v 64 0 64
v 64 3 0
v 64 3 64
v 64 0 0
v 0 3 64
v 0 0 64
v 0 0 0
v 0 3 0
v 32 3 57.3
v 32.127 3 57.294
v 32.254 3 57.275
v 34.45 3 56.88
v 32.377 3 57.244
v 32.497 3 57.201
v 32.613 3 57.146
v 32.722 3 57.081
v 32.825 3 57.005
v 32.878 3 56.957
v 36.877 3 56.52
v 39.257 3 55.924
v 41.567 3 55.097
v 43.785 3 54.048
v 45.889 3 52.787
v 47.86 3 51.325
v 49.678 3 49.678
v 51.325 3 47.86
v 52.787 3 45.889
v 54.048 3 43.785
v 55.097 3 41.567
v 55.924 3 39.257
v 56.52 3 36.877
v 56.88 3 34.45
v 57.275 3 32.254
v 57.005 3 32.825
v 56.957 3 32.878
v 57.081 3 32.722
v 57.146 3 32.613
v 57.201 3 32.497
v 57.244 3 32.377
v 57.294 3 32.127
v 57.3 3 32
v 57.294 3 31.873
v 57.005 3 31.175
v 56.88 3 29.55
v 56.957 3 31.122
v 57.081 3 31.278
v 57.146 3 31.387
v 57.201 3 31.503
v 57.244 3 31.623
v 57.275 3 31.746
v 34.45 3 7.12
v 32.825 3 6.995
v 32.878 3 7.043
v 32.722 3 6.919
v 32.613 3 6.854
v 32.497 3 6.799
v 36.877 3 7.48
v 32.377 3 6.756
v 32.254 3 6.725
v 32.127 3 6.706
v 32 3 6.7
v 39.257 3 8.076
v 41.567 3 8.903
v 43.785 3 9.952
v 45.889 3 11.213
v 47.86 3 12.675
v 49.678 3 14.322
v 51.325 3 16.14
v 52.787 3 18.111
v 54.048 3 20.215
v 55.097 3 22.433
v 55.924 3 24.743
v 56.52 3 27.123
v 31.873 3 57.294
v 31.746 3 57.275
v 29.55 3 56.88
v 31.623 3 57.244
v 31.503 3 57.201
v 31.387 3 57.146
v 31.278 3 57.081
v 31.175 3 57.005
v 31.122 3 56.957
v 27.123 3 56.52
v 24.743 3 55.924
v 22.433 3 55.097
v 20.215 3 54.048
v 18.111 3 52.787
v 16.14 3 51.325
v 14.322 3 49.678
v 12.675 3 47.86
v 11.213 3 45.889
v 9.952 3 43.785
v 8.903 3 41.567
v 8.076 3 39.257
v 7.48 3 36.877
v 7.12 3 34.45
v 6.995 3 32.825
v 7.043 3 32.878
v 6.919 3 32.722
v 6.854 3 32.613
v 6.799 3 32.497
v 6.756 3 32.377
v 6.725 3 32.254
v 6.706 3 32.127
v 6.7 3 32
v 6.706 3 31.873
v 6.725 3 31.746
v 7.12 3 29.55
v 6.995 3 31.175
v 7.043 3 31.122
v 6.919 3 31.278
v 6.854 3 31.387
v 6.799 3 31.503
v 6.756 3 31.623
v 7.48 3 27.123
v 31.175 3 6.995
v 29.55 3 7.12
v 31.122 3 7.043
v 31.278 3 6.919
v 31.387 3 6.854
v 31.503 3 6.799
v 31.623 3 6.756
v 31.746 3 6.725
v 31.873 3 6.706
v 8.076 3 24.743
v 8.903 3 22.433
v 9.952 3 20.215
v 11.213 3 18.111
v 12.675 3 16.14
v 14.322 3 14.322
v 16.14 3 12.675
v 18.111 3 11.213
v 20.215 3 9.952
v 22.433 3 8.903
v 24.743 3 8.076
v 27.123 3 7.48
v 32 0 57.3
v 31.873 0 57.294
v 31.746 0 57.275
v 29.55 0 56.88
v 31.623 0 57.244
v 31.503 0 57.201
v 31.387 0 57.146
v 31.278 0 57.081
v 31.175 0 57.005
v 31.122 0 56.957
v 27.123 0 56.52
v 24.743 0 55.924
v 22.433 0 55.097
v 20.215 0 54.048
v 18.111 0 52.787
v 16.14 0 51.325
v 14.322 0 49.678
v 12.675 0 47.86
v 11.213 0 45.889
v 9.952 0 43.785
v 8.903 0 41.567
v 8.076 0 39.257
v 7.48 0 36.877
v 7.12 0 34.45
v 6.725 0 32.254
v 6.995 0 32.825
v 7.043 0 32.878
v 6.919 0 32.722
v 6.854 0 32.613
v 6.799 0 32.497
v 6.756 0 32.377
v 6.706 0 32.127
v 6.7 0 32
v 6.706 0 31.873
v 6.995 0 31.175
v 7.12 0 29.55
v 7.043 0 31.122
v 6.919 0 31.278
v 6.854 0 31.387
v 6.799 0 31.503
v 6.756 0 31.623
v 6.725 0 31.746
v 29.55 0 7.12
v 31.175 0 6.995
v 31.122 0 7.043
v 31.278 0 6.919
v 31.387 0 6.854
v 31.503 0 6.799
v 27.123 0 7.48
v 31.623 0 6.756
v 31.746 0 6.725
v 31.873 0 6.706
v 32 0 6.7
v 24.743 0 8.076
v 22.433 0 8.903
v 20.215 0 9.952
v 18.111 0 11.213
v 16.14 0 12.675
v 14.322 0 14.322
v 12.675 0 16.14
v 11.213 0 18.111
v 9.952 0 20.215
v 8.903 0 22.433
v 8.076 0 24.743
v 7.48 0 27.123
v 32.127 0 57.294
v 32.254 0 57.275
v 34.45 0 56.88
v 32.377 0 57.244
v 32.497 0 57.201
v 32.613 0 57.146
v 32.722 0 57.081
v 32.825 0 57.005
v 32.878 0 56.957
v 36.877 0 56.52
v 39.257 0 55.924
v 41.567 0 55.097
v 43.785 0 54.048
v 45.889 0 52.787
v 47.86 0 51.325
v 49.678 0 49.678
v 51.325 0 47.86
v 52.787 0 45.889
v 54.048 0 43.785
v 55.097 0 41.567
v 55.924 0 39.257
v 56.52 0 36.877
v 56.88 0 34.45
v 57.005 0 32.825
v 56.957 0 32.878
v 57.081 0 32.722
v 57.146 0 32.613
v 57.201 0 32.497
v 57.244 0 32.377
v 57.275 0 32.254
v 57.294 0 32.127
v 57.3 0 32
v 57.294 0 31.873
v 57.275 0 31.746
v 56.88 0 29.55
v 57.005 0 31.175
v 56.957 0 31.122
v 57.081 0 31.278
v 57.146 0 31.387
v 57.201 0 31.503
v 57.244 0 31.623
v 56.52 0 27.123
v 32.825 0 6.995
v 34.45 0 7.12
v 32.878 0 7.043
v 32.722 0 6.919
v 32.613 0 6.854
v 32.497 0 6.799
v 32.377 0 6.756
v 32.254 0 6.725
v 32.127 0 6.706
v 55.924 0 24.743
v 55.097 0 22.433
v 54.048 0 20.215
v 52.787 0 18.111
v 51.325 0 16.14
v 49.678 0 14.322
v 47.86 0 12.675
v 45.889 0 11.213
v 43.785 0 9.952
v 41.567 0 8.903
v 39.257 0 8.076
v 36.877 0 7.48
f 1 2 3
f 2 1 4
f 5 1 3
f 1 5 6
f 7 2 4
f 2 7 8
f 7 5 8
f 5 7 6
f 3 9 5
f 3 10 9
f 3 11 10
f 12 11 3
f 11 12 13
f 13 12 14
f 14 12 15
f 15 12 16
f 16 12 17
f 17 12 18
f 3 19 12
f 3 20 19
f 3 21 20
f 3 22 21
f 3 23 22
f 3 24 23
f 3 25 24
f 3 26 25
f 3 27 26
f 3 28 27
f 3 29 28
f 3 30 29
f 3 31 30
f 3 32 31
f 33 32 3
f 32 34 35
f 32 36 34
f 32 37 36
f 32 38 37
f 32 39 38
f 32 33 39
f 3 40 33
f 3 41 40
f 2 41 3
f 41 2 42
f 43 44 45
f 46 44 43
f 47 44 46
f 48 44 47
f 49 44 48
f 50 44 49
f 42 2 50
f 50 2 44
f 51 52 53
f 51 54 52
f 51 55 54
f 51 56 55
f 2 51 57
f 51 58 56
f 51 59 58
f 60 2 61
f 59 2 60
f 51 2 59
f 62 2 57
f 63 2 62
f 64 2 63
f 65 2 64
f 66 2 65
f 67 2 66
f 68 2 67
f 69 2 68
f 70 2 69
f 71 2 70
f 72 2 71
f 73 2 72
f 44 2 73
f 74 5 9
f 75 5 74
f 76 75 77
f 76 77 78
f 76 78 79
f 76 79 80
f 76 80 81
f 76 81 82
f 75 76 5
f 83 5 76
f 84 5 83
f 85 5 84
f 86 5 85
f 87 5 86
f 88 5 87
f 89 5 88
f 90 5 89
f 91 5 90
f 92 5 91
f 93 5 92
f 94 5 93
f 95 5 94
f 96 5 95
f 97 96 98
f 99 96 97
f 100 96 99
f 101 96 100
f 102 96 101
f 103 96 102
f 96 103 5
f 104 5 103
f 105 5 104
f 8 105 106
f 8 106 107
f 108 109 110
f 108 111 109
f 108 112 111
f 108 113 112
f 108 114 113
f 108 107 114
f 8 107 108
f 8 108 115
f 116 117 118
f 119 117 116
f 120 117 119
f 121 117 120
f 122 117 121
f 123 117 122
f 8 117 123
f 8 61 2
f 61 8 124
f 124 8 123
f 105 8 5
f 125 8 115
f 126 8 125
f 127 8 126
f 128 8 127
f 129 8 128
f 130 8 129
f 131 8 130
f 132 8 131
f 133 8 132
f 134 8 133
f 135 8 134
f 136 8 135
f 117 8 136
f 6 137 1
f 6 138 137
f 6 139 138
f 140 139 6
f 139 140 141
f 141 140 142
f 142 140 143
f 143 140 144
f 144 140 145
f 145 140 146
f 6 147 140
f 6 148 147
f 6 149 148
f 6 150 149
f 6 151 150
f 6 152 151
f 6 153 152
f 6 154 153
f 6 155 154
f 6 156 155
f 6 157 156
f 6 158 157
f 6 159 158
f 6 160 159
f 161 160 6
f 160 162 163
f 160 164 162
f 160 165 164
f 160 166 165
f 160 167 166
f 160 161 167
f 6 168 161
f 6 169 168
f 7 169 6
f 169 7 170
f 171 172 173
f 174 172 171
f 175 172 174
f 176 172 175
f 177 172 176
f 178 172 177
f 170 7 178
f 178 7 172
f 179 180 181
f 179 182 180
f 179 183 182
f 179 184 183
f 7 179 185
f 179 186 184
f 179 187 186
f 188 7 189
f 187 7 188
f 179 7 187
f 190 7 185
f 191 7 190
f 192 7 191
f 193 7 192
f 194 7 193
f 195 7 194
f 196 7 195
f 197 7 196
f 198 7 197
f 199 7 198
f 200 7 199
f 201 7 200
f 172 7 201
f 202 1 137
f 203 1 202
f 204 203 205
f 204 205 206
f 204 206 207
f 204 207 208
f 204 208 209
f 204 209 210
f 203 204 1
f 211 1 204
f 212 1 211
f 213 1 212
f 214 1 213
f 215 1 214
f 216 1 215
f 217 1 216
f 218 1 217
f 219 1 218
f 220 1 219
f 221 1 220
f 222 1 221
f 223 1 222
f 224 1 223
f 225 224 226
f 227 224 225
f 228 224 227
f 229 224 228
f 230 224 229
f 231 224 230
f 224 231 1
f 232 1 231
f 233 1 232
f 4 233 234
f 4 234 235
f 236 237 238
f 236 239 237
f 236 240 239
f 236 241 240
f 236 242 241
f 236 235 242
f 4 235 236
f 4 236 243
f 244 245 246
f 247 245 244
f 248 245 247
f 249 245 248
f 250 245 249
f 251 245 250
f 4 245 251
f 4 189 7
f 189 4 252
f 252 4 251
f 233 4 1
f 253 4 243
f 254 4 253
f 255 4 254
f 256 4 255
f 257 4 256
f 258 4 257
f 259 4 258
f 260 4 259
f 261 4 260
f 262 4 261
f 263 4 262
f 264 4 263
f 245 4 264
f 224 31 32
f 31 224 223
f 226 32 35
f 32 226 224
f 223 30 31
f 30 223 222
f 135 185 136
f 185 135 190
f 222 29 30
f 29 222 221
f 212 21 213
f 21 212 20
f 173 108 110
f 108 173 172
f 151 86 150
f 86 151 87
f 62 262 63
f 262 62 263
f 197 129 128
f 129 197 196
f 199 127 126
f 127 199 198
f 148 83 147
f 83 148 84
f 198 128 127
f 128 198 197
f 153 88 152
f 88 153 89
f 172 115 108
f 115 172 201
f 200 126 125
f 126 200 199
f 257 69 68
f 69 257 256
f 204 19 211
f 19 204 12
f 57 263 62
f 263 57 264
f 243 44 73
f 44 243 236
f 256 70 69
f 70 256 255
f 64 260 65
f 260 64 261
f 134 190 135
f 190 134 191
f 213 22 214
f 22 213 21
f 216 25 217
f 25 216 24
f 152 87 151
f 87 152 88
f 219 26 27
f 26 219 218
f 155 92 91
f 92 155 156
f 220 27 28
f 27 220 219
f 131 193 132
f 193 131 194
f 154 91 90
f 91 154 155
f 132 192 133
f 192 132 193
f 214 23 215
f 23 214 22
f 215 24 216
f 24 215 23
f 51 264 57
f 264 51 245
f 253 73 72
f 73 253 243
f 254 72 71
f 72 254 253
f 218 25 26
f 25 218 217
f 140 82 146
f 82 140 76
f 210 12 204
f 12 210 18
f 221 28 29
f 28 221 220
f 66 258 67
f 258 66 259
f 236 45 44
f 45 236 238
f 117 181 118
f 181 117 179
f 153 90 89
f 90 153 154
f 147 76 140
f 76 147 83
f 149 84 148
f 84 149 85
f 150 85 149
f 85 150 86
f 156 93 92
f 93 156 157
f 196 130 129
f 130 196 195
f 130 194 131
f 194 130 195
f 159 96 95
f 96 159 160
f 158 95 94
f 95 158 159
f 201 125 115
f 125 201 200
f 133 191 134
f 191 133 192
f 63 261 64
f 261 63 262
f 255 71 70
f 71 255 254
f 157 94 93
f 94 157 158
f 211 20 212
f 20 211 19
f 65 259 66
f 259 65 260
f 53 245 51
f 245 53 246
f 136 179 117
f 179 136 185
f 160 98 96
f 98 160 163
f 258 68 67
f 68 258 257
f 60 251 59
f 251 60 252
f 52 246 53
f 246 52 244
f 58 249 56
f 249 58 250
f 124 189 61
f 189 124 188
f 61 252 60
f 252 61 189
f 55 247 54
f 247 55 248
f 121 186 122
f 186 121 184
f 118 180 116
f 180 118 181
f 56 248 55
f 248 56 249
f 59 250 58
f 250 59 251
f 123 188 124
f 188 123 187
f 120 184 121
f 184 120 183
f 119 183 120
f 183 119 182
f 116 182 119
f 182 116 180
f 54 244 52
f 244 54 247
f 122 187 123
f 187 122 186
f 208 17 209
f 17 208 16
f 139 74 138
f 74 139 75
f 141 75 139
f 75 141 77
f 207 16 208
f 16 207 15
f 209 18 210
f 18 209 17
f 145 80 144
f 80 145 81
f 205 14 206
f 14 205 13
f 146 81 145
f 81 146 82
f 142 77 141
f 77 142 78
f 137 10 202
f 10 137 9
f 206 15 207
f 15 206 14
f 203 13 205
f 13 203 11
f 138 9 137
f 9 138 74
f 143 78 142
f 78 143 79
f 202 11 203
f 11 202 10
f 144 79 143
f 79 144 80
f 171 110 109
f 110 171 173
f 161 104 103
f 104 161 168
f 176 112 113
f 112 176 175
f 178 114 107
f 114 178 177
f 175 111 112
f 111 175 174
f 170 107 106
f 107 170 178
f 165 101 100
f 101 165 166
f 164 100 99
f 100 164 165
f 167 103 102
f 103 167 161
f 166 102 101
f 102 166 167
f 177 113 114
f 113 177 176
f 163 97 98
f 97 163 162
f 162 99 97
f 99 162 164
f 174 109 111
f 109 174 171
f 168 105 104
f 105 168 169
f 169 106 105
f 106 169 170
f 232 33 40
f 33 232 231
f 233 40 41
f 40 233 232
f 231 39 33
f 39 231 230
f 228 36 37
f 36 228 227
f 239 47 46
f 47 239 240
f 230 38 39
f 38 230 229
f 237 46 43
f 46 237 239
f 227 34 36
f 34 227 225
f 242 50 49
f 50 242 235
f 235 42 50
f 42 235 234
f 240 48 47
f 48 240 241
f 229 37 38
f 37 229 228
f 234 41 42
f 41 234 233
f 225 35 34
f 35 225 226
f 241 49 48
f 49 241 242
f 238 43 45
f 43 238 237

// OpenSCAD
// StatusBeacon_LightCube_LEDCarrier.scad
// Holds a 16 LED WS2812B ring behind the diffuser.
// Adjust screw holes if your LED ring is different.
// Units: mm

$fn = 64;

difference() {
    cube([64,3,64]);

    // main light opening
    translate([32,1.5,32]) rotate([90,0,0]) cylinder(h=5,d=50,center=true);

    // LED ring screw holes
    translate([32,1.5,8]) rotate([90,0,0]) cylinder(h=5,d=2.6,center=true);
    translate([32,1.5,56]) rotate([90,0,0]) cylinder(h=5,d=2.6,center=true);
    translate([8,1.5,32]) rotate([90,0,0]) cylinder(h=5,d=2.6,center=true);
    translate([56,1.5,32]) rotate([90,0,0]) cylinder(h=5,d=2.6,center=true);
}
